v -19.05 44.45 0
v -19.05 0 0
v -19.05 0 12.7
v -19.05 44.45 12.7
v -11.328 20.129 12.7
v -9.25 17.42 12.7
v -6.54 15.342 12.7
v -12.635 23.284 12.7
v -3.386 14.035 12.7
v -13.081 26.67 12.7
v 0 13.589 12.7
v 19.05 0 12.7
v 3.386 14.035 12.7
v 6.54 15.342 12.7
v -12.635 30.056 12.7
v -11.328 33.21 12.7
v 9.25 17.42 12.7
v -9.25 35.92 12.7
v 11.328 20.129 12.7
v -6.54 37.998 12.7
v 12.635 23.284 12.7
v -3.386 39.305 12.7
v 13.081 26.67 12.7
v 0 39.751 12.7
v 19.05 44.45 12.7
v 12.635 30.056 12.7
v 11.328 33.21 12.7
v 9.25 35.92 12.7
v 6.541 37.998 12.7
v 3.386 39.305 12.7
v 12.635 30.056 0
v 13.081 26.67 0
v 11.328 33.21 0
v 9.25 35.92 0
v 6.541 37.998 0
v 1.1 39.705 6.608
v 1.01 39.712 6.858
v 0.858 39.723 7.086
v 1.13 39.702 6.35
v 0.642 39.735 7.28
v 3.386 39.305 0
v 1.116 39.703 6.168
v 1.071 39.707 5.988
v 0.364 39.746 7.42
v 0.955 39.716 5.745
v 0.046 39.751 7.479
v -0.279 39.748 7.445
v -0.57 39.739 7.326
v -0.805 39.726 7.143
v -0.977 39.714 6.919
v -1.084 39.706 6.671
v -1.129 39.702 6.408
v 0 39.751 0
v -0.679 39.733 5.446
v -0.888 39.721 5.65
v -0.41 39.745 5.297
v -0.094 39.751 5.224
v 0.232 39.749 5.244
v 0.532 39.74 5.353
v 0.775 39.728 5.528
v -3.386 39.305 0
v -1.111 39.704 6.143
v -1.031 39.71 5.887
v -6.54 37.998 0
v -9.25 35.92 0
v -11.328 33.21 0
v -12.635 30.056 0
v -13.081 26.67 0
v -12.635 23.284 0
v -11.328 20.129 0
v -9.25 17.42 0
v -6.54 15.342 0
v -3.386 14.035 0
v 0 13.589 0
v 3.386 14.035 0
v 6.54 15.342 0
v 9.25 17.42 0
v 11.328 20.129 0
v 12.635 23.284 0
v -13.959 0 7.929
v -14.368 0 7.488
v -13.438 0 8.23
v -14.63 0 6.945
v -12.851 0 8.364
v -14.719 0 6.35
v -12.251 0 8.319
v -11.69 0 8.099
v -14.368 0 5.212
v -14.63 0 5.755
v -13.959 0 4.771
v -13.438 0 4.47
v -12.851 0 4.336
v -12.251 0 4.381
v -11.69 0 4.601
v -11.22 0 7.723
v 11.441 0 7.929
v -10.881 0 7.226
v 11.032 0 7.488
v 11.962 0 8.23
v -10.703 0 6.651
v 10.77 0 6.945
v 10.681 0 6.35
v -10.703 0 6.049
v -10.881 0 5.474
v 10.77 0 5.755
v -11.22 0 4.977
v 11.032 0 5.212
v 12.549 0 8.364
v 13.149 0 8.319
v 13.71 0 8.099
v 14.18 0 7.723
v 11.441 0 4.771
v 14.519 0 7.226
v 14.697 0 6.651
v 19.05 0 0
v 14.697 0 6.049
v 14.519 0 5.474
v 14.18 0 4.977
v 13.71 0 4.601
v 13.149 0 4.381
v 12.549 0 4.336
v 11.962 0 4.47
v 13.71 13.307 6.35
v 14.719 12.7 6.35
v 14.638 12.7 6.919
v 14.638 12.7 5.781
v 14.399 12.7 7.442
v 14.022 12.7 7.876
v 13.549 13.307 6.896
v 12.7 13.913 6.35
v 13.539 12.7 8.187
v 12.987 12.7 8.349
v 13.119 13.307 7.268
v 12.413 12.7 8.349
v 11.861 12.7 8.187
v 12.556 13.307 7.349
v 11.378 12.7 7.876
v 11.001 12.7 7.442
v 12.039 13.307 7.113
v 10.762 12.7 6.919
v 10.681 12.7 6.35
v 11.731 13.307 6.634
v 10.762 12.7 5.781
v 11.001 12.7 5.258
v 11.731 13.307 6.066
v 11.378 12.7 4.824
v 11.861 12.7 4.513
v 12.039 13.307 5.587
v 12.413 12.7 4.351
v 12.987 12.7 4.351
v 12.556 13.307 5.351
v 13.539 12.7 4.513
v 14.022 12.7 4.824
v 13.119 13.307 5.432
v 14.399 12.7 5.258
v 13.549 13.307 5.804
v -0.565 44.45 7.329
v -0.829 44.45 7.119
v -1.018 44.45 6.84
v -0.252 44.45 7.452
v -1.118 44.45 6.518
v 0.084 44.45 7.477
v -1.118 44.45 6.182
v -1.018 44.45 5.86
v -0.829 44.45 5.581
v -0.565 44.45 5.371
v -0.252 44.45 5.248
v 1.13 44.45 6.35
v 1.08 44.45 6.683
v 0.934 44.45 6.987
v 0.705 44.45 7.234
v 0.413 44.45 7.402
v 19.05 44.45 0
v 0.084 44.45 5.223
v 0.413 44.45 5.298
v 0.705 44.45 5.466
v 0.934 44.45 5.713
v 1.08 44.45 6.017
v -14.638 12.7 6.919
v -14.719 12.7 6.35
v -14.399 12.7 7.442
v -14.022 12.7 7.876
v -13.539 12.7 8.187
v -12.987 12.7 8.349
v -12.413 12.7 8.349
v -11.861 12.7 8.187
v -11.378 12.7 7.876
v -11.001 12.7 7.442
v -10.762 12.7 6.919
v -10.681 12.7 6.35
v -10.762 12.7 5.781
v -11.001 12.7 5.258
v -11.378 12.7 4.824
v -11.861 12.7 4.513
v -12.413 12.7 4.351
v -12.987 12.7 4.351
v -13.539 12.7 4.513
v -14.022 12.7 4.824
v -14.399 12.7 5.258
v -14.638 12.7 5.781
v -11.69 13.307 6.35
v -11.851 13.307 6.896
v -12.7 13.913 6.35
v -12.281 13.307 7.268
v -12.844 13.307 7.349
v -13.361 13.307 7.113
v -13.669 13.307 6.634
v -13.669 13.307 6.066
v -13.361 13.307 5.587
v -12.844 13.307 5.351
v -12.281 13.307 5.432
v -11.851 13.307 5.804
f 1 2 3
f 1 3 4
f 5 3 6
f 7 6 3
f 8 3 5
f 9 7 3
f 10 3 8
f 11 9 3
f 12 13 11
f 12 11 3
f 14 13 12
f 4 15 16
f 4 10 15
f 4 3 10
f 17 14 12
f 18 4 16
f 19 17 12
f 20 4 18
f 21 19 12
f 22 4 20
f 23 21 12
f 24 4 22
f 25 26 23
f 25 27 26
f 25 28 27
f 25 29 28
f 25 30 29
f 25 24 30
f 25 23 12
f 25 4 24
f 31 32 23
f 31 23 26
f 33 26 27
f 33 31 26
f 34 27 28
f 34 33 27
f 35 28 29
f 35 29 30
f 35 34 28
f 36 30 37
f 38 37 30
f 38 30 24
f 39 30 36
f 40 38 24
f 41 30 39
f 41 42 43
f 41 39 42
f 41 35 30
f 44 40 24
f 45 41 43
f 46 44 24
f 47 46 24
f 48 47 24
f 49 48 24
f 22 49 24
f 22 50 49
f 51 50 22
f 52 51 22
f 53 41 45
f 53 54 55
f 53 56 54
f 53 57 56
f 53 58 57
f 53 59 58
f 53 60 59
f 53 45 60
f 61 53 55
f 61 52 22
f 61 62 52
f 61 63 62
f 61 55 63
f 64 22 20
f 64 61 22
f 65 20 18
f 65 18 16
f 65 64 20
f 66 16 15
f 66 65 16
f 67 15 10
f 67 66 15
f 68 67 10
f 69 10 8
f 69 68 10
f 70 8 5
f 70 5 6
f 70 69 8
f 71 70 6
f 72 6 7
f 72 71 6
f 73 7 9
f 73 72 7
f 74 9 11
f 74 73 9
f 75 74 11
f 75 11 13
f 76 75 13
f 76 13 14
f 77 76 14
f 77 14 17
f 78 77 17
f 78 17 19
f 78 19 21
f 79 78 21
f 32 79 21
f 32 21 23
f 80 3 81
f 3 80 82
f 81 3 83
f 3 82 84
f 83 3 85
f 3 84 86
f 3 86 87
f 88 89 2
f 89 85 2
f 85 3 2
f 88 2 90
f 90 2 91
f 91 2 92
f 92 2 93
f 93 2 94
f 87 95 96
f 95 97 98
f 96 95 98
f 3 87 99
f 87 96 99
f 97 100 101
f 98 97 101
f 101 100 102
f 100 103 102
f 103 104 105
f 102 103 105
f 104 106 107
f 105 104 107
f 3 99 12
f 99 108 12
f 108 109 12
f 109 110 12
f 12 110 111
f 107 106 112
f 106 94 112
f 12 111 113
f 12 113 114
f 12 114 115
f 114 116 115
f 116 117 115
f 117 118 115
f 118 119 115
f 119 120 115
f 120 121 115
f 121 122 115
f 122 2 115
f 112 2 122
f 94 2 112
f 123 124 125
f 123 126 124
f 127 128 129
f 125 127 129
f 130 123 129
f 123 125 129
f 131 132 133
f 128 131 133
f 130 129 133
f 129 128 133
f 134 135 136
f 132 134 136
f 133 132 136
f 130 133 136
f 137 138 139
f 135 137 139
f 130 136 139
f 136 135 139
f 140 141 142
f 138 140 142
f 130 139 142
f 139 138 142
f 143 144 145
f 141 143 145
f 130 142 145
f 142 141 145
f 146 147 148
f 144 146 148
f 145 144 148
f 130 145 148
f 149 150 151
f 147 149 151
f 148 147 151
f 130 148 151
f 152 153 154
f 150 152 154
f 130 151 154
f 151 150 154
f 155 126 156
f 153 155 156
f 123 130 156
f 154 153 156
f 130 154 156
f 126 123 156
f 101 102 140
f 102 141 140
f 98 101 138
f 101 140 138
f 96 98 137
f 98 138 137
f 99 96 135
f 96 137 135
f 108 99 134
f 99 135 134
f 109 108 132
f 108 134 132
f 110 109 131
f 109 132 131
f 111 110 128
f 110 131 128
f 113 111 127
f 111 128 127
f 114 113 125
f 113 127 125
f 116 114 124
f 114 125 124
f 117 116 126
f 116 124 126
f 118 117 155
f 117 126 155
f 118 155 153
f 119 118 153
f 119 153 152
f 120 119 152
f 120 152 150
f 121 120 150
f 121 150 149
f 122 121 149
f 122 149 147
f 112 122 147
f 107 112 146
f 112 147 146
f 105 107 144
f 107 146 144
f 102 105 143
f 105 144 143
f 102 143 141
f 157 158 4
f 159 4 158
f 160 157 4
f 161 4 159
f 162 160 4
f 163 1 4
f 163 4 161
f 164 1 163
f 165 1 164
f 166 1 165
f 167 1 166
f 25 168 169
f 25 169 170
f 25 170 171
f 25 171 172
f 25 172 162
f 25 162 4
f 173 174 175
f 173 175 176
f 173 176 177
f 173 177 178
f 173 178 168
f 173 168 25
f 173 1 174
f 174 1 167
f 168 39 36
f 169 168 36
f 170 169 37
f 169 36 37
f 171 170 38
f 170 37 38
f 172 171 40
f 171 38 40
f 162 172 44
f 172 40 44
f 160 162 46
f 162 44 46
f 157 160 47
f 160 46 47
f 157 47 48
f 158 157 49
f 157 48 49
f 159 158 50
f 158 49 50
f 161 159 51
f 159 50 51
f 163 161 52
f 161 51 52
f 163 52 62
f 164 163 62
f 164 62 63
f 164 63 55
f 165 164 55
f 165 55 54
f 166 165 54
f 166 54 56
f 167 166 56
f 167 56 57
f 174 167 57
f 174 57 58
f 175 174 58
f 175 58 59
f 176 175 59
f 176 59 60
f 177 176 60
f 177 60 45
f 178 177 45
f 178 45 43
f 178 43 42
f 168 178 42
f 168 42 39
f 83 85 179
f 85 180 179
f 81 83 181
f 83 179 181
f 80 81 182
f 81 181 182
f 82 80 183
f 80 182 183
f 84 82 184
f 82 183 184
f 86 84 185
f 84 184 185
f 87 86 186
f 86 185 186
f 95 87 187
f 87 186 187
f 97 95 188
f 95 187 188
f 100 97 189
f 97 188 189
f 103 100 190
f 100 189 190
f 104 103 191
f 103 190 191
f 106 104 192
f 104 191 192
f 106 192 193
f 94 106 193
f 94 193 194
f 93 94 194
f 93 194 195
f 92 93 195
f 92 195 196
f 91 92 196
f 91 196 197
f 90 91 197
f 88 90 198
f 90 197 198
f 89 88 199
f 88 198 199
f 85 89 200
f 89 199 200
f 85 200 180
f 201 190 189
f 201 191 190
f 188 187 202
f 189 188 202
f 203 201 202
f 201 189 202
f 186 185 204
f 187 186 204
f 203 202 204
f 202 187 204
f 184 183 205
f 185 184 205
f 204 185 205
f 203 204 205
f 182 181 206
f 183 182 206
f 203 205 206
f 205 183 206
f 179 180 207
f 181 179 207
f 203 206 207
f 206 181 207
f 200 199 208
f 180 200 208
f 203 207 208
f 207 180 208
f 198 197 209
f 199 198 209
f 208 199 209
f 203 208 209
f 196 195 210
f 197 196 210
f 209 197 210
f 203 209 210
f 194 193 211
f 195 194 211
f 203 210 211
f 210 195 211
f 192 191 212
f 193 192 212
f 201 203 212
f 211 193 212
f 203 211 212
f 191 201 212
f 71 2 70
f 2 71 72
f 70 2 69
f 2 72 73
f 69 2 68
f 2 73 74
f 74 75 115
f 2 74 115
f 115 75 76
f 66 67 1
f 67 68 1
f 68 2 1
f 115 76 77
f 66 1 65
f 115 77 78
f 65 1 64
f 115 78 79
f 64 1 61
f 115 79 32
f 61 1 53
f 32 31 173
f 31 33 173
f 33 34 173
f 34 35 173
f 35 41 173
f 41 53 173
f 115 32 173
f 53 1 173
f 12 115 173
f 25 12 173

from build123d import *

# Parameters (mm, degrees)
SKETCH1_W                  = 38.1
SKETCH1_H                  = 44.45
SKETCH1_R                  = 13.081
BOSS_EXTRUDE1_DEPTH        = 12.7
F_4_40_TAPPED_HOLE1_D      = 2.2606
F_4_40_TAPPED_HOLE1_DEPTH  = 17.779
F_4_40_TAPPED_HOLE1_TIP    = 0.679152758
F_10_32_TAPPED_HOLE1_D     = 4.0386
F_10_32_TAPPED_HOLE1_DEPTH = 12.7
F_10_32_TAPPED_HOLE1_TIP   = 1.213317848


with BuildPart() as part:
    # Sketch1 → Boss-Extrude1 (new body)
    with BuildSketch(Plane.XY):
        with Locations((0, 22.225)):
            Rectangle(SKETCH1_W, SKETCH1_H)
        with Locations((0, 26.67)):
            Circle(SKETCH1_R, mode=Mode.SUBTRACT)
    extrude(amount=BOSS_EXTRUDE1_DEPTH)

    # #4-40 Tapped Hole1
    with Locations(Plane(origin=(0, 44.45, 0), x_dir=(-1, 0, 0), z_dir=(0, 1, 0))):
        with Locations((0, 6.35)):
            Hole(F_4_40_TAPPED_HOLE1_D / 2, depth=F_4_40_TAPPED_HOLE1_DEPTH)
            with Locations((0, 0, -(F_4_40_TAPPED_HOLE1_DEPTH + F_4_40_TAPPED_HOLE1_TIP / 2))):  # 118° drill point
                Cone(0, F_4_40_TAPPED_HOLE1_D / 2, F_4_40_TAPPED_HOLE1_TIP, mode=Mode.SUBTRACT)

    # #10-32 Tapped Hole1
    with Locations(Plane.XZ):
        with Locations((-12.7, 6.35), (12.7, 6.35)):
            Hole(F_10_32_TAPPED_HOLE1_D / 2, depth=F_10_32_TAPPED_HOLE1_DEPTH)
            with Locations((0, 0, -(F_10_32_TAPPED_HOLE1_DEPTH + F_10_32_TAPPED_HOLE1_TIP / 2))):  # 118° drill point
                Cone(0, F_10_32_TAPPED_HOLE1_D / 2, F_10_32_TAPPED_HOLE1_TIP, mode=Mode.SUBTRACT)


solid = part.part
